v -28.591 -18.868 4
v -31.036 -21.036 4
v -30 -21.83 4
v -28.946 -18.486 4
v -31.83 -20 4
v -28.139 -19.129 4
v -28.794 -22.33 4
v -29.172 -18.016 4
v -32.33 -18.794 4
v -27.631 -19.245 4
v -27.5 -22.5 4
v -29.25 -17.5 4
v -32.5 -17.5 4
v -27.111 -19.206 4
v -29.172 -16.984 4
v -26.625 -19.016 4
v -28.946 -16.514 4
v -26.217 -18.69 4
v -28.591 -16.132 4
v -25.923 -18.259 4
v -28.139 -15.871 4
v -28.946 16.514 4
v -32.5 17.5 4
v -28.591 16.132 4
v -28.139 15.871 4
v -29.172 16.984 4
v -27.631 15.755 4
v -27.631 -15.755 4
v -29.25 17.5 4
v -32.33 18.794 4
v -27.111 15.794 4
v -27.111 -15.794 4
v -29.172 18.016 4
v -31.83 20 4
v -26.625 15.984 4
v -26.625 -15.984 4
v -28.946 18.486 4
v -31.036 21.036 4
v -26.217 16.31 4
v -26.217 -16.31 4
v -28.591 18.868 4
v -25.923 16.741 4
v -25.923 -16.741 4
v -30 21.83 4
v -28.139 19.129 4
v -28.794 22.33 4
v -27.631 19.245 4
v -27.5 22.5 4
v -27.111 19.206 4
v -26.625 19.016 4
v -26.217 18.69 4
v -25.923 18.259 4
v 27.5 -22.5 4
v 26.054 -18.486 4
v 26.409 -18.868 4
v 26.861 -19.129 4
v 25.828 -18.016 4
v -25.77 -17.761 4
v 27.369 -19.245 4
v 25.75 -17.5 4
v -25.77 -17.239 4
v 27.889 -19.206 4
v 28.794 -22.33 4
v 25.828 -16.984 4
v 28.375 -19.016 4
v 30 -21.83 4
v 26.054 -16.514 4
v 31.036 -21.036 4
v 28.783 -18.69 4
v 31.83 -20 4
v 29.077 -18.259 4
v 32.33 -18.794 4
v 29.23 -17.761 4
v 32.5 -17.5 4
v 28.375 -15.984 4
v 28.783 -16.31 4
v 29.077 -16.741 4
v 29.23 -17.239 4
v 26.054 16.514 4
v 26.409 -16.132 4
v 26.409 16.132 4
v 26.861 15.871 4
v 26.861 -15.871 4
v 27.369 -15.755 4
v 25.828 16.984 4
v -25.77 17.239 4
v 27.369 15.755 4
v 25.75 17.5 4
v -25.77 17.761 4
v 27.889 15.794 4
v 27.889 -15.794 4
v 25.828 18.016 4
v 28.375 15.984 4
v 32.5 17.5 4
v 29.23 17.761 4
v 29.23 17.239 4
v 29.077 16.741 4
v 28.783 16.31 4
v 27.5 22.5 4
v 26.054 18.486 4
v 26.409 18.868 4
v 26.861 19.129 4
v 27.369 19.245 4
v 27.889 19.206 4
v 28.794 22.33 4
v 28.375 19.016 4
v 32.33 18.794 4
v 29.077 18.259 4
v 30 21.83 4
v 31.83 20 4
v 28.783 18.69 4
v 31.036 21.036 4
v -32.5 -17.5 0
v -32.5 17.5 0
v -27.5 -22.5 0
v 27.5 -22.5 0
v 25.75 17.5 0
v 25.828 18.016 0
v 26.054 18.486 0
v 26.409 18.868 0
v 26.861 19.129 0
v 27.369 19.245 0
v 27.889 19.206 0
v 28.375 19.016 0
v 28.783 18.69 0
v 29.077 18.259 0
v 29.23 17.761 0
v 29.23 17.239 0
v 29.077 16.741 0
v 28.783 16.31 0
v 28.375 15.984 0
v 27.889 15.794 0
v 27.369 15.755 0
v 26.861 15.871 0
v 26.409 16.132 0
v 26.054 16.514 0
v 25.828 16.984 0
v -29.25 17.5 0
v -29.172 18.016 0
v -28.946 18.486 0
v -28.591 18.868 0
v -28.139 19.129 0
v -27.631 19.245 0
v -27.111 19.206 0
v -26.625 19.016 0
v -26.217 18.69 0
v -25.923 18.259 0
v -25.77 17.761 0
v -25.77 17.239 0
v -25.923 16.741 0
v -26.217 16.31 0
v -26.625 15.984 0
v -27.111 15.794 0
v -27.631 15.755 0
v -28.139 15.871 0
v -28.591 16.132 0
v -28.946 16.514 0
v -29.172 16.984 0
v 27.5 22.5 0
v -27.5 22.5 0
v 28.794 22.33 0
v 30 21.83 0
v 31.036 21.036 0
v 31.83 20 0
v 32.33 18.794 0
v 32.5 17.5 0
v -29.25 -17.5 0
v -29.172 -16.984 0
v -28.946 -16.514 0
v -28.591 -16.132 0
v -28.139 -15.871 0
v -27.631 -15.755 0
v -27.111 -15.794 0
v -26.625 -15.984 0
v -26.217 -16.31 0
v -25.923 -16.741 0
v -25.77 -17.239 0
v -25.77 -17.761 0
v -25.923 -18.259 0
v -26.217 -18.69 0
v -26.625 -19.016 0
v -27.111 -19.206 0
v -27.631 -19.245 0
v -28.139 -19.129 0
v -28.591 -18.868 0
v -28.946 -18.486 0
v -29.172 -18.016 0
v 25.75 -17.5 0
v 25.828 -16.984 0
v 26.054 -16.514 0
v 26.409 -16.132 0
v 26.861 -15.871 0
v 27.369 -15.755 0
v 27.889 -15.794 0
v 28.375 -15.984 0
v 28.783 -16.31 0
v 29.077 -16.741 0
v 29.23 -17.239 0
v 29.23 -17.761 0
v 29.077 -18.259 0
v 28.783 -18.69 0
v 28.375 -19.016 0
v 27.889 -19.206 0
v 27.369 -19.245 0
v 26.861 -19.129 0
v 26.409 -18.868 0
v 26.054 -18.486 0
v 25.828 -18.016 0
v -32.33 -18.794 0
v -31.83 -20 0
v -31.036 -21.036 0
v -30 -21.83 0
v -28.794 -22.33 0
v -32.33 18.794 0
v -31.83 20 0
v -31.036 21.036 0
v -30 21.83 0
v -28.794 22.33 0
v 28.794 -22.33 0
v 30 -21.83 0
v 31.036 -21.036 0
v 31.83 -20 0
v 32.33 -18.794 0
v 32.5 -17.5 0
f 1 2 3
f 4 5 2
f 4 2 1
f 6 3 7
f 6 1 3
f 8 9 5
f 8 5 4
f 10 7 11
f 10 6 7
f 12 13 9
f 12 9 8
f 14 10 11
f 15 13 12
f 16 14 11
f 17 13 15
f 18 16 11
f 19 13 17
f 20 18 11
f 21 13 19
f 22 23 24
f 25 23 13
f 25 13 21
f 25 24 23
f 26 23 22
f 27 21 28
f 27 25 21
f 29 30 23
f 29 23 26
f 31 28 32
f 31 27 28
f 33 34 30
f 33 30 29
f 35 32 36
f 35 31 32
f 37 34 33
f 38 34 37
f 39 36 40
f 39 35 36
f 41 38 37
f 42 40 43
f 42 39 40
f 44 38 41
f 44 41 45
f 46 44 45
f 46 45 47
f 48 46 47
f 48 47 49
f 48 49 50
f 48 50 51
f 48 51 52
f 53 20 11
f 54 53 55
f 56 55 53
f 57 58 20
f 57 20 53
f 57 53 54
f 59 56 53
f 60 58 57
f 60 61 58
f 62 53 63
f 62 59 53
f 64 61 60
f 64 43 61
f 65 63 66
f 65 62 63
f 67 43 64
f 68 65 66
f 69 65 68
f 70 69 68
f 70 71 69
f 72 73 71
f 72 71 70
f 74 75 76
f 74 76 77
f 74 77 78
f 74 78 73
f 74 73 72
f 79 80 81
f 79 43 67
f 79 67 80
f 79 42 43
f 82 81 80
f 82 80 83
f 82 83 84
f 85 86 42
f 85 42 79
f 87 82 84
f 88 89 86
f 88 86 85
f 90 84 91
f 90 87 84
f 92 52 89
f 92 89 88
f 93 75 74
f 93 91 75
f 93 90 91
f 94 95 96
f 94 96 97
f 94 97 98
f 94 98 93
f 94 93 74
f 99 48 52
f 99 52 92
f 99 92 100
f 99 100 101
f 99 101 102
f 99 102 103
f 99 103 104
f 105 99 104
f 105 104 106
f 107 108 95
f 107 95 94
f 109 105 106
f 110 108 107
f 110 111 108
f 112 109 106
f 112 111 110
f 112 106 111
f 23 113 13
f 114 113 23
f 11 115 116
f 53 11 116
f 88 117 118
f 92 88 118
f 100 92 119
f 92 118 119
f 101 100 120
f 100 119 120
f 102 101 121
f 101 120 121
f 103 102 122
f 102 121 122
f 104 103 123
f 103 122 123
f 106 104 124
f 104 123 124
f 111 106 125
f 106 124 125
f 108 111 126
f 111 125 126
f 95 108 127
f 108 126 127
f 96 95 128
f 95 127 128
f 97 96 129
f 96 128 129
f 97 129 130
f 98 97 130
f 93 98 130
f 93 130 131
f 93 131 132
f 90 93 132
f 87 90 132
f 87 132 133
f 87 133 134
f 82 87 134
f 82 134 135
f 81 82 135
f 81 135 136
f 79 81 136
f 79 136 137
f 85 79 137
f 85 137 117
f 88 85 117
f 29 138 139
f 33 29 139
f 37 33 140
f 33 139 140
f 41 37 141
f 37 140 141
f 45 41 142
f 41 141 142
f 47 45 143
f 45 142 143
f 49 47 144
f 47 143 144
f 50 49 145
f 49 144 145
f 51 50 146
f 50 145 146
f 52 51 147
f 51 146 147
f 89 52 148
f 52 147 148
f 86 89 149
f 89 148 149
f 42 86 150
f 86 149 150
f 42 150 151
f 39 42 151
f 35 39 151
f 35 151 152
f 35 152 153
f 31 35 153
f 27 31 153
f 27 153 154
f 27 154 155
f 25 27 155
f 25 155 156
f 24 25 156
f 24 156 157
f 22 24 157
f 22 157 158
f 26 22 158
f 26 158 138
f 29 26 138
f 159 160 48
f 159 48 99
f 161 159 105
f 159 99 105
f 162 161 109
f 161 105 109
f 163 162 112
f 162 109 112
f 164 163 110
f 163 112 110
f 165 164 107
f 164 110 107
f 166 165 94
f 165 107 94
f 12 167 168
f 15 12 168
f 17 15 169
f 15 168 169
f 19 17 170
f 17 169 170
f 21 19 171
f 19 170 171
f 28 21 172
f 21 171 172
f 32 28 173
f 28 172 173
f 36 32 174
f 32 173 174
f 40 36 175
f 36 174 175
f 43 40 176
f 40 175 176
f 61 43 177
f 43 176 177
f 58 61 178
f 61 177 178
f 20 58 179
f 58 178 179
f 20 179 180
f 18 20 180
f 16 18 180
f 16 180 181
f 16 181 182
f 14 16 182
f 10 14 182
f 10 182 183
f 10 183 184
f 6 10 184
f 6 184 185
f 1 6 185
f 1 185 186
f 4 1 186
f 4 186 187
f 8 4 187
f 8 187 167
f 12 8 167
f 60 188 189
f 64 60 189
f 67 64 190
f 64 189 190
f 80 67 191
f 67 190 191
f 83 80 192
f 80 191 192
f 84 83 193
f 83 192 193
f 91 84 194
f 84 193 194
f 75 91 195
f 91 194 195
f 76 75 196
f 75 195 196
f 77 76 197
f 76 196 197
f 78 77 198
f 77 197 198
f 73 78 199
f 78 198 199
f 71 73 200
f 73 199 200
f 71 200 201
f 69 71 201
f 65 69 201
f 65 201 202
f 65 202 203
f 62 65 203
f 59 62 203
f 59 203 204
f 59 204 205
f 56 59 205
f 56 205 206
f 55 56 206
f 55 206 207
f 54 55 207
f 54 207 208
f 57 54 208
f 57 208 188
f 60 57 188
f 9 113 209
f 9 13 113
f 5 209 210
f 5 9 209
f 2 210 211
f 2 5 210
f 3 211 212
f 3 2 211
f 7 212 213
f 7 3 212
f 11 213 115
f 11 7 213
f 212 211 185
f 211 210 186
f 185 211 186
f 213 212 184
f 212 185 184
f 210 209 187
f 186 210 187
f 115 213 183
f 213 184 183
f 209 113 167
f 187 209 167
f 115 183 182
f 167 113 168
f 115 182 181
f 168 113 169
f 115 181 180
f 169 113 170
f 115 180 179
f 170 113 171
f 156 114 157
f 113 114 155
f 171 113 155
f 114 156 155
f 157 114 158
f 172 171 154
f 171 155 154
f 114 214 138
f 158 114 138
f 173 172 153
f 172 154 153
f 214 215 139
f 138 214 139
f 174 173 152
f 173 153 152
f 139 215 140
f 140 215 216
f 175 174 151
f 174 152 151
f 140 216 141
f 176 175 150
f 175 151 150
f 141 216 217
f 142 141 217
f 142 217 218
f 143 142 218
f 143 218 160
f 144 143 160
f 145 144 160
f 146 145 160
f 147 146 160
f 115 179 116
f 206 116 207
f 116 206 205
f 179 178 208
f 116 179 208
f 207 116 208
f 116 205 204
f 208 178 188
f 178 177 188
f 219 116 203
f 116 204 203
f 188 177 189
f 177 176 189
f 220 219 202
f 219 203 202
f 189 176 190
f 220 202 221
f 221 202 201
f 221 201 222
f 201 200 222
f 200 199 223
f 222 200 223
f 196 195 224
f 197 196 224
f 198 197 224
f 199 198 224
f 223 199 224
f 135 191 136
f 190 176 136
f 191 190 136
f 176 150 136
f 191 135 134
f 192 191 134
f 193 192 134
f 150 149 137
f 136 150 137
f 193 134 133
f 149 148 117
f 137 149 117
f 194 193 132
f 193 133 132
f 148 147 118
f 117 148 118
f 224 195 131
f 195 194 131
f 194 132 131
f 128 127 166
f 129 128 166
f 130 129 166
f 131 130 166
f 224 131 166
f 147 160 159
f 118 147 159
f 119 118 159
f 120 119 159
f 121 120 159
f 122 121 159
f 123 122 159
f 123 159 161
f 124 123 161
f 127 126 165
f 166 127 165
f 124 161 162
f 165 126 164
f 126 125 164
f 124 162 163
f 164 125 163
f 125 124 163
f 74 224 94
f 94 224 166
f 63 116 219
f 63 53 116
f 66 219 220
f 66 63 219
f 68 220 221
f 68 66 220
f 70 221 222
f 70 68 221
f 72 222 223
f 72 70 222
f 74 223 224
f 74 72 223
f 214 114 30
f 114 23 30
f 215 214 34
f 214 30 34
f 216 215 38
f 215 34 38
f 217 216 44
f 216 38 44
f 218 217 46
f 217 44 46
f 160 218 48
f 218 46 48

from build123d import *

# Parameters (mm, degrees)
SKETCH_1_W              = 65
SKETCH_1_H              = 45
EXTRUDE_1_DEPTH         = 4
HOLE_WIZARD_3_5_3_5_1_D = 3.5
FILLET_1_R              = 5


with BuildPart() as part:
    # 草图1 → 凸台-拉伸1 (new body)
    with BuildSketch(Plane.XY):
        Rectangle(SKETCH_1_W, SKETCH_1_H)
    extrude(amount=EXTRUDE_1_DEPTH)

    # Ø3.5 (3.5) 直径孔1 (through all)
    with Locations(Plane.XY.offset(4)):
        with Locations((-27.5, 17.5), (-27.5, -17.5), (27.5, 17.5), (27.5, -17.5)):
            Hole(HOLE_WIZARD_3_5_3_5_1_D / 2)

    # 圆角1
    fillet_1_edges = [part.edges().sort_by_distance(p)[0] for p in [
        (32.5, -22.5, 2),
        (-32.5, -22.5, 2),
        (-32.5, 22.5, 2),
        (32.5, 22.5, 2),
    ]]
    fillet(fillet_1_edges, radius=FILLET_1_R)


solid = part.part
